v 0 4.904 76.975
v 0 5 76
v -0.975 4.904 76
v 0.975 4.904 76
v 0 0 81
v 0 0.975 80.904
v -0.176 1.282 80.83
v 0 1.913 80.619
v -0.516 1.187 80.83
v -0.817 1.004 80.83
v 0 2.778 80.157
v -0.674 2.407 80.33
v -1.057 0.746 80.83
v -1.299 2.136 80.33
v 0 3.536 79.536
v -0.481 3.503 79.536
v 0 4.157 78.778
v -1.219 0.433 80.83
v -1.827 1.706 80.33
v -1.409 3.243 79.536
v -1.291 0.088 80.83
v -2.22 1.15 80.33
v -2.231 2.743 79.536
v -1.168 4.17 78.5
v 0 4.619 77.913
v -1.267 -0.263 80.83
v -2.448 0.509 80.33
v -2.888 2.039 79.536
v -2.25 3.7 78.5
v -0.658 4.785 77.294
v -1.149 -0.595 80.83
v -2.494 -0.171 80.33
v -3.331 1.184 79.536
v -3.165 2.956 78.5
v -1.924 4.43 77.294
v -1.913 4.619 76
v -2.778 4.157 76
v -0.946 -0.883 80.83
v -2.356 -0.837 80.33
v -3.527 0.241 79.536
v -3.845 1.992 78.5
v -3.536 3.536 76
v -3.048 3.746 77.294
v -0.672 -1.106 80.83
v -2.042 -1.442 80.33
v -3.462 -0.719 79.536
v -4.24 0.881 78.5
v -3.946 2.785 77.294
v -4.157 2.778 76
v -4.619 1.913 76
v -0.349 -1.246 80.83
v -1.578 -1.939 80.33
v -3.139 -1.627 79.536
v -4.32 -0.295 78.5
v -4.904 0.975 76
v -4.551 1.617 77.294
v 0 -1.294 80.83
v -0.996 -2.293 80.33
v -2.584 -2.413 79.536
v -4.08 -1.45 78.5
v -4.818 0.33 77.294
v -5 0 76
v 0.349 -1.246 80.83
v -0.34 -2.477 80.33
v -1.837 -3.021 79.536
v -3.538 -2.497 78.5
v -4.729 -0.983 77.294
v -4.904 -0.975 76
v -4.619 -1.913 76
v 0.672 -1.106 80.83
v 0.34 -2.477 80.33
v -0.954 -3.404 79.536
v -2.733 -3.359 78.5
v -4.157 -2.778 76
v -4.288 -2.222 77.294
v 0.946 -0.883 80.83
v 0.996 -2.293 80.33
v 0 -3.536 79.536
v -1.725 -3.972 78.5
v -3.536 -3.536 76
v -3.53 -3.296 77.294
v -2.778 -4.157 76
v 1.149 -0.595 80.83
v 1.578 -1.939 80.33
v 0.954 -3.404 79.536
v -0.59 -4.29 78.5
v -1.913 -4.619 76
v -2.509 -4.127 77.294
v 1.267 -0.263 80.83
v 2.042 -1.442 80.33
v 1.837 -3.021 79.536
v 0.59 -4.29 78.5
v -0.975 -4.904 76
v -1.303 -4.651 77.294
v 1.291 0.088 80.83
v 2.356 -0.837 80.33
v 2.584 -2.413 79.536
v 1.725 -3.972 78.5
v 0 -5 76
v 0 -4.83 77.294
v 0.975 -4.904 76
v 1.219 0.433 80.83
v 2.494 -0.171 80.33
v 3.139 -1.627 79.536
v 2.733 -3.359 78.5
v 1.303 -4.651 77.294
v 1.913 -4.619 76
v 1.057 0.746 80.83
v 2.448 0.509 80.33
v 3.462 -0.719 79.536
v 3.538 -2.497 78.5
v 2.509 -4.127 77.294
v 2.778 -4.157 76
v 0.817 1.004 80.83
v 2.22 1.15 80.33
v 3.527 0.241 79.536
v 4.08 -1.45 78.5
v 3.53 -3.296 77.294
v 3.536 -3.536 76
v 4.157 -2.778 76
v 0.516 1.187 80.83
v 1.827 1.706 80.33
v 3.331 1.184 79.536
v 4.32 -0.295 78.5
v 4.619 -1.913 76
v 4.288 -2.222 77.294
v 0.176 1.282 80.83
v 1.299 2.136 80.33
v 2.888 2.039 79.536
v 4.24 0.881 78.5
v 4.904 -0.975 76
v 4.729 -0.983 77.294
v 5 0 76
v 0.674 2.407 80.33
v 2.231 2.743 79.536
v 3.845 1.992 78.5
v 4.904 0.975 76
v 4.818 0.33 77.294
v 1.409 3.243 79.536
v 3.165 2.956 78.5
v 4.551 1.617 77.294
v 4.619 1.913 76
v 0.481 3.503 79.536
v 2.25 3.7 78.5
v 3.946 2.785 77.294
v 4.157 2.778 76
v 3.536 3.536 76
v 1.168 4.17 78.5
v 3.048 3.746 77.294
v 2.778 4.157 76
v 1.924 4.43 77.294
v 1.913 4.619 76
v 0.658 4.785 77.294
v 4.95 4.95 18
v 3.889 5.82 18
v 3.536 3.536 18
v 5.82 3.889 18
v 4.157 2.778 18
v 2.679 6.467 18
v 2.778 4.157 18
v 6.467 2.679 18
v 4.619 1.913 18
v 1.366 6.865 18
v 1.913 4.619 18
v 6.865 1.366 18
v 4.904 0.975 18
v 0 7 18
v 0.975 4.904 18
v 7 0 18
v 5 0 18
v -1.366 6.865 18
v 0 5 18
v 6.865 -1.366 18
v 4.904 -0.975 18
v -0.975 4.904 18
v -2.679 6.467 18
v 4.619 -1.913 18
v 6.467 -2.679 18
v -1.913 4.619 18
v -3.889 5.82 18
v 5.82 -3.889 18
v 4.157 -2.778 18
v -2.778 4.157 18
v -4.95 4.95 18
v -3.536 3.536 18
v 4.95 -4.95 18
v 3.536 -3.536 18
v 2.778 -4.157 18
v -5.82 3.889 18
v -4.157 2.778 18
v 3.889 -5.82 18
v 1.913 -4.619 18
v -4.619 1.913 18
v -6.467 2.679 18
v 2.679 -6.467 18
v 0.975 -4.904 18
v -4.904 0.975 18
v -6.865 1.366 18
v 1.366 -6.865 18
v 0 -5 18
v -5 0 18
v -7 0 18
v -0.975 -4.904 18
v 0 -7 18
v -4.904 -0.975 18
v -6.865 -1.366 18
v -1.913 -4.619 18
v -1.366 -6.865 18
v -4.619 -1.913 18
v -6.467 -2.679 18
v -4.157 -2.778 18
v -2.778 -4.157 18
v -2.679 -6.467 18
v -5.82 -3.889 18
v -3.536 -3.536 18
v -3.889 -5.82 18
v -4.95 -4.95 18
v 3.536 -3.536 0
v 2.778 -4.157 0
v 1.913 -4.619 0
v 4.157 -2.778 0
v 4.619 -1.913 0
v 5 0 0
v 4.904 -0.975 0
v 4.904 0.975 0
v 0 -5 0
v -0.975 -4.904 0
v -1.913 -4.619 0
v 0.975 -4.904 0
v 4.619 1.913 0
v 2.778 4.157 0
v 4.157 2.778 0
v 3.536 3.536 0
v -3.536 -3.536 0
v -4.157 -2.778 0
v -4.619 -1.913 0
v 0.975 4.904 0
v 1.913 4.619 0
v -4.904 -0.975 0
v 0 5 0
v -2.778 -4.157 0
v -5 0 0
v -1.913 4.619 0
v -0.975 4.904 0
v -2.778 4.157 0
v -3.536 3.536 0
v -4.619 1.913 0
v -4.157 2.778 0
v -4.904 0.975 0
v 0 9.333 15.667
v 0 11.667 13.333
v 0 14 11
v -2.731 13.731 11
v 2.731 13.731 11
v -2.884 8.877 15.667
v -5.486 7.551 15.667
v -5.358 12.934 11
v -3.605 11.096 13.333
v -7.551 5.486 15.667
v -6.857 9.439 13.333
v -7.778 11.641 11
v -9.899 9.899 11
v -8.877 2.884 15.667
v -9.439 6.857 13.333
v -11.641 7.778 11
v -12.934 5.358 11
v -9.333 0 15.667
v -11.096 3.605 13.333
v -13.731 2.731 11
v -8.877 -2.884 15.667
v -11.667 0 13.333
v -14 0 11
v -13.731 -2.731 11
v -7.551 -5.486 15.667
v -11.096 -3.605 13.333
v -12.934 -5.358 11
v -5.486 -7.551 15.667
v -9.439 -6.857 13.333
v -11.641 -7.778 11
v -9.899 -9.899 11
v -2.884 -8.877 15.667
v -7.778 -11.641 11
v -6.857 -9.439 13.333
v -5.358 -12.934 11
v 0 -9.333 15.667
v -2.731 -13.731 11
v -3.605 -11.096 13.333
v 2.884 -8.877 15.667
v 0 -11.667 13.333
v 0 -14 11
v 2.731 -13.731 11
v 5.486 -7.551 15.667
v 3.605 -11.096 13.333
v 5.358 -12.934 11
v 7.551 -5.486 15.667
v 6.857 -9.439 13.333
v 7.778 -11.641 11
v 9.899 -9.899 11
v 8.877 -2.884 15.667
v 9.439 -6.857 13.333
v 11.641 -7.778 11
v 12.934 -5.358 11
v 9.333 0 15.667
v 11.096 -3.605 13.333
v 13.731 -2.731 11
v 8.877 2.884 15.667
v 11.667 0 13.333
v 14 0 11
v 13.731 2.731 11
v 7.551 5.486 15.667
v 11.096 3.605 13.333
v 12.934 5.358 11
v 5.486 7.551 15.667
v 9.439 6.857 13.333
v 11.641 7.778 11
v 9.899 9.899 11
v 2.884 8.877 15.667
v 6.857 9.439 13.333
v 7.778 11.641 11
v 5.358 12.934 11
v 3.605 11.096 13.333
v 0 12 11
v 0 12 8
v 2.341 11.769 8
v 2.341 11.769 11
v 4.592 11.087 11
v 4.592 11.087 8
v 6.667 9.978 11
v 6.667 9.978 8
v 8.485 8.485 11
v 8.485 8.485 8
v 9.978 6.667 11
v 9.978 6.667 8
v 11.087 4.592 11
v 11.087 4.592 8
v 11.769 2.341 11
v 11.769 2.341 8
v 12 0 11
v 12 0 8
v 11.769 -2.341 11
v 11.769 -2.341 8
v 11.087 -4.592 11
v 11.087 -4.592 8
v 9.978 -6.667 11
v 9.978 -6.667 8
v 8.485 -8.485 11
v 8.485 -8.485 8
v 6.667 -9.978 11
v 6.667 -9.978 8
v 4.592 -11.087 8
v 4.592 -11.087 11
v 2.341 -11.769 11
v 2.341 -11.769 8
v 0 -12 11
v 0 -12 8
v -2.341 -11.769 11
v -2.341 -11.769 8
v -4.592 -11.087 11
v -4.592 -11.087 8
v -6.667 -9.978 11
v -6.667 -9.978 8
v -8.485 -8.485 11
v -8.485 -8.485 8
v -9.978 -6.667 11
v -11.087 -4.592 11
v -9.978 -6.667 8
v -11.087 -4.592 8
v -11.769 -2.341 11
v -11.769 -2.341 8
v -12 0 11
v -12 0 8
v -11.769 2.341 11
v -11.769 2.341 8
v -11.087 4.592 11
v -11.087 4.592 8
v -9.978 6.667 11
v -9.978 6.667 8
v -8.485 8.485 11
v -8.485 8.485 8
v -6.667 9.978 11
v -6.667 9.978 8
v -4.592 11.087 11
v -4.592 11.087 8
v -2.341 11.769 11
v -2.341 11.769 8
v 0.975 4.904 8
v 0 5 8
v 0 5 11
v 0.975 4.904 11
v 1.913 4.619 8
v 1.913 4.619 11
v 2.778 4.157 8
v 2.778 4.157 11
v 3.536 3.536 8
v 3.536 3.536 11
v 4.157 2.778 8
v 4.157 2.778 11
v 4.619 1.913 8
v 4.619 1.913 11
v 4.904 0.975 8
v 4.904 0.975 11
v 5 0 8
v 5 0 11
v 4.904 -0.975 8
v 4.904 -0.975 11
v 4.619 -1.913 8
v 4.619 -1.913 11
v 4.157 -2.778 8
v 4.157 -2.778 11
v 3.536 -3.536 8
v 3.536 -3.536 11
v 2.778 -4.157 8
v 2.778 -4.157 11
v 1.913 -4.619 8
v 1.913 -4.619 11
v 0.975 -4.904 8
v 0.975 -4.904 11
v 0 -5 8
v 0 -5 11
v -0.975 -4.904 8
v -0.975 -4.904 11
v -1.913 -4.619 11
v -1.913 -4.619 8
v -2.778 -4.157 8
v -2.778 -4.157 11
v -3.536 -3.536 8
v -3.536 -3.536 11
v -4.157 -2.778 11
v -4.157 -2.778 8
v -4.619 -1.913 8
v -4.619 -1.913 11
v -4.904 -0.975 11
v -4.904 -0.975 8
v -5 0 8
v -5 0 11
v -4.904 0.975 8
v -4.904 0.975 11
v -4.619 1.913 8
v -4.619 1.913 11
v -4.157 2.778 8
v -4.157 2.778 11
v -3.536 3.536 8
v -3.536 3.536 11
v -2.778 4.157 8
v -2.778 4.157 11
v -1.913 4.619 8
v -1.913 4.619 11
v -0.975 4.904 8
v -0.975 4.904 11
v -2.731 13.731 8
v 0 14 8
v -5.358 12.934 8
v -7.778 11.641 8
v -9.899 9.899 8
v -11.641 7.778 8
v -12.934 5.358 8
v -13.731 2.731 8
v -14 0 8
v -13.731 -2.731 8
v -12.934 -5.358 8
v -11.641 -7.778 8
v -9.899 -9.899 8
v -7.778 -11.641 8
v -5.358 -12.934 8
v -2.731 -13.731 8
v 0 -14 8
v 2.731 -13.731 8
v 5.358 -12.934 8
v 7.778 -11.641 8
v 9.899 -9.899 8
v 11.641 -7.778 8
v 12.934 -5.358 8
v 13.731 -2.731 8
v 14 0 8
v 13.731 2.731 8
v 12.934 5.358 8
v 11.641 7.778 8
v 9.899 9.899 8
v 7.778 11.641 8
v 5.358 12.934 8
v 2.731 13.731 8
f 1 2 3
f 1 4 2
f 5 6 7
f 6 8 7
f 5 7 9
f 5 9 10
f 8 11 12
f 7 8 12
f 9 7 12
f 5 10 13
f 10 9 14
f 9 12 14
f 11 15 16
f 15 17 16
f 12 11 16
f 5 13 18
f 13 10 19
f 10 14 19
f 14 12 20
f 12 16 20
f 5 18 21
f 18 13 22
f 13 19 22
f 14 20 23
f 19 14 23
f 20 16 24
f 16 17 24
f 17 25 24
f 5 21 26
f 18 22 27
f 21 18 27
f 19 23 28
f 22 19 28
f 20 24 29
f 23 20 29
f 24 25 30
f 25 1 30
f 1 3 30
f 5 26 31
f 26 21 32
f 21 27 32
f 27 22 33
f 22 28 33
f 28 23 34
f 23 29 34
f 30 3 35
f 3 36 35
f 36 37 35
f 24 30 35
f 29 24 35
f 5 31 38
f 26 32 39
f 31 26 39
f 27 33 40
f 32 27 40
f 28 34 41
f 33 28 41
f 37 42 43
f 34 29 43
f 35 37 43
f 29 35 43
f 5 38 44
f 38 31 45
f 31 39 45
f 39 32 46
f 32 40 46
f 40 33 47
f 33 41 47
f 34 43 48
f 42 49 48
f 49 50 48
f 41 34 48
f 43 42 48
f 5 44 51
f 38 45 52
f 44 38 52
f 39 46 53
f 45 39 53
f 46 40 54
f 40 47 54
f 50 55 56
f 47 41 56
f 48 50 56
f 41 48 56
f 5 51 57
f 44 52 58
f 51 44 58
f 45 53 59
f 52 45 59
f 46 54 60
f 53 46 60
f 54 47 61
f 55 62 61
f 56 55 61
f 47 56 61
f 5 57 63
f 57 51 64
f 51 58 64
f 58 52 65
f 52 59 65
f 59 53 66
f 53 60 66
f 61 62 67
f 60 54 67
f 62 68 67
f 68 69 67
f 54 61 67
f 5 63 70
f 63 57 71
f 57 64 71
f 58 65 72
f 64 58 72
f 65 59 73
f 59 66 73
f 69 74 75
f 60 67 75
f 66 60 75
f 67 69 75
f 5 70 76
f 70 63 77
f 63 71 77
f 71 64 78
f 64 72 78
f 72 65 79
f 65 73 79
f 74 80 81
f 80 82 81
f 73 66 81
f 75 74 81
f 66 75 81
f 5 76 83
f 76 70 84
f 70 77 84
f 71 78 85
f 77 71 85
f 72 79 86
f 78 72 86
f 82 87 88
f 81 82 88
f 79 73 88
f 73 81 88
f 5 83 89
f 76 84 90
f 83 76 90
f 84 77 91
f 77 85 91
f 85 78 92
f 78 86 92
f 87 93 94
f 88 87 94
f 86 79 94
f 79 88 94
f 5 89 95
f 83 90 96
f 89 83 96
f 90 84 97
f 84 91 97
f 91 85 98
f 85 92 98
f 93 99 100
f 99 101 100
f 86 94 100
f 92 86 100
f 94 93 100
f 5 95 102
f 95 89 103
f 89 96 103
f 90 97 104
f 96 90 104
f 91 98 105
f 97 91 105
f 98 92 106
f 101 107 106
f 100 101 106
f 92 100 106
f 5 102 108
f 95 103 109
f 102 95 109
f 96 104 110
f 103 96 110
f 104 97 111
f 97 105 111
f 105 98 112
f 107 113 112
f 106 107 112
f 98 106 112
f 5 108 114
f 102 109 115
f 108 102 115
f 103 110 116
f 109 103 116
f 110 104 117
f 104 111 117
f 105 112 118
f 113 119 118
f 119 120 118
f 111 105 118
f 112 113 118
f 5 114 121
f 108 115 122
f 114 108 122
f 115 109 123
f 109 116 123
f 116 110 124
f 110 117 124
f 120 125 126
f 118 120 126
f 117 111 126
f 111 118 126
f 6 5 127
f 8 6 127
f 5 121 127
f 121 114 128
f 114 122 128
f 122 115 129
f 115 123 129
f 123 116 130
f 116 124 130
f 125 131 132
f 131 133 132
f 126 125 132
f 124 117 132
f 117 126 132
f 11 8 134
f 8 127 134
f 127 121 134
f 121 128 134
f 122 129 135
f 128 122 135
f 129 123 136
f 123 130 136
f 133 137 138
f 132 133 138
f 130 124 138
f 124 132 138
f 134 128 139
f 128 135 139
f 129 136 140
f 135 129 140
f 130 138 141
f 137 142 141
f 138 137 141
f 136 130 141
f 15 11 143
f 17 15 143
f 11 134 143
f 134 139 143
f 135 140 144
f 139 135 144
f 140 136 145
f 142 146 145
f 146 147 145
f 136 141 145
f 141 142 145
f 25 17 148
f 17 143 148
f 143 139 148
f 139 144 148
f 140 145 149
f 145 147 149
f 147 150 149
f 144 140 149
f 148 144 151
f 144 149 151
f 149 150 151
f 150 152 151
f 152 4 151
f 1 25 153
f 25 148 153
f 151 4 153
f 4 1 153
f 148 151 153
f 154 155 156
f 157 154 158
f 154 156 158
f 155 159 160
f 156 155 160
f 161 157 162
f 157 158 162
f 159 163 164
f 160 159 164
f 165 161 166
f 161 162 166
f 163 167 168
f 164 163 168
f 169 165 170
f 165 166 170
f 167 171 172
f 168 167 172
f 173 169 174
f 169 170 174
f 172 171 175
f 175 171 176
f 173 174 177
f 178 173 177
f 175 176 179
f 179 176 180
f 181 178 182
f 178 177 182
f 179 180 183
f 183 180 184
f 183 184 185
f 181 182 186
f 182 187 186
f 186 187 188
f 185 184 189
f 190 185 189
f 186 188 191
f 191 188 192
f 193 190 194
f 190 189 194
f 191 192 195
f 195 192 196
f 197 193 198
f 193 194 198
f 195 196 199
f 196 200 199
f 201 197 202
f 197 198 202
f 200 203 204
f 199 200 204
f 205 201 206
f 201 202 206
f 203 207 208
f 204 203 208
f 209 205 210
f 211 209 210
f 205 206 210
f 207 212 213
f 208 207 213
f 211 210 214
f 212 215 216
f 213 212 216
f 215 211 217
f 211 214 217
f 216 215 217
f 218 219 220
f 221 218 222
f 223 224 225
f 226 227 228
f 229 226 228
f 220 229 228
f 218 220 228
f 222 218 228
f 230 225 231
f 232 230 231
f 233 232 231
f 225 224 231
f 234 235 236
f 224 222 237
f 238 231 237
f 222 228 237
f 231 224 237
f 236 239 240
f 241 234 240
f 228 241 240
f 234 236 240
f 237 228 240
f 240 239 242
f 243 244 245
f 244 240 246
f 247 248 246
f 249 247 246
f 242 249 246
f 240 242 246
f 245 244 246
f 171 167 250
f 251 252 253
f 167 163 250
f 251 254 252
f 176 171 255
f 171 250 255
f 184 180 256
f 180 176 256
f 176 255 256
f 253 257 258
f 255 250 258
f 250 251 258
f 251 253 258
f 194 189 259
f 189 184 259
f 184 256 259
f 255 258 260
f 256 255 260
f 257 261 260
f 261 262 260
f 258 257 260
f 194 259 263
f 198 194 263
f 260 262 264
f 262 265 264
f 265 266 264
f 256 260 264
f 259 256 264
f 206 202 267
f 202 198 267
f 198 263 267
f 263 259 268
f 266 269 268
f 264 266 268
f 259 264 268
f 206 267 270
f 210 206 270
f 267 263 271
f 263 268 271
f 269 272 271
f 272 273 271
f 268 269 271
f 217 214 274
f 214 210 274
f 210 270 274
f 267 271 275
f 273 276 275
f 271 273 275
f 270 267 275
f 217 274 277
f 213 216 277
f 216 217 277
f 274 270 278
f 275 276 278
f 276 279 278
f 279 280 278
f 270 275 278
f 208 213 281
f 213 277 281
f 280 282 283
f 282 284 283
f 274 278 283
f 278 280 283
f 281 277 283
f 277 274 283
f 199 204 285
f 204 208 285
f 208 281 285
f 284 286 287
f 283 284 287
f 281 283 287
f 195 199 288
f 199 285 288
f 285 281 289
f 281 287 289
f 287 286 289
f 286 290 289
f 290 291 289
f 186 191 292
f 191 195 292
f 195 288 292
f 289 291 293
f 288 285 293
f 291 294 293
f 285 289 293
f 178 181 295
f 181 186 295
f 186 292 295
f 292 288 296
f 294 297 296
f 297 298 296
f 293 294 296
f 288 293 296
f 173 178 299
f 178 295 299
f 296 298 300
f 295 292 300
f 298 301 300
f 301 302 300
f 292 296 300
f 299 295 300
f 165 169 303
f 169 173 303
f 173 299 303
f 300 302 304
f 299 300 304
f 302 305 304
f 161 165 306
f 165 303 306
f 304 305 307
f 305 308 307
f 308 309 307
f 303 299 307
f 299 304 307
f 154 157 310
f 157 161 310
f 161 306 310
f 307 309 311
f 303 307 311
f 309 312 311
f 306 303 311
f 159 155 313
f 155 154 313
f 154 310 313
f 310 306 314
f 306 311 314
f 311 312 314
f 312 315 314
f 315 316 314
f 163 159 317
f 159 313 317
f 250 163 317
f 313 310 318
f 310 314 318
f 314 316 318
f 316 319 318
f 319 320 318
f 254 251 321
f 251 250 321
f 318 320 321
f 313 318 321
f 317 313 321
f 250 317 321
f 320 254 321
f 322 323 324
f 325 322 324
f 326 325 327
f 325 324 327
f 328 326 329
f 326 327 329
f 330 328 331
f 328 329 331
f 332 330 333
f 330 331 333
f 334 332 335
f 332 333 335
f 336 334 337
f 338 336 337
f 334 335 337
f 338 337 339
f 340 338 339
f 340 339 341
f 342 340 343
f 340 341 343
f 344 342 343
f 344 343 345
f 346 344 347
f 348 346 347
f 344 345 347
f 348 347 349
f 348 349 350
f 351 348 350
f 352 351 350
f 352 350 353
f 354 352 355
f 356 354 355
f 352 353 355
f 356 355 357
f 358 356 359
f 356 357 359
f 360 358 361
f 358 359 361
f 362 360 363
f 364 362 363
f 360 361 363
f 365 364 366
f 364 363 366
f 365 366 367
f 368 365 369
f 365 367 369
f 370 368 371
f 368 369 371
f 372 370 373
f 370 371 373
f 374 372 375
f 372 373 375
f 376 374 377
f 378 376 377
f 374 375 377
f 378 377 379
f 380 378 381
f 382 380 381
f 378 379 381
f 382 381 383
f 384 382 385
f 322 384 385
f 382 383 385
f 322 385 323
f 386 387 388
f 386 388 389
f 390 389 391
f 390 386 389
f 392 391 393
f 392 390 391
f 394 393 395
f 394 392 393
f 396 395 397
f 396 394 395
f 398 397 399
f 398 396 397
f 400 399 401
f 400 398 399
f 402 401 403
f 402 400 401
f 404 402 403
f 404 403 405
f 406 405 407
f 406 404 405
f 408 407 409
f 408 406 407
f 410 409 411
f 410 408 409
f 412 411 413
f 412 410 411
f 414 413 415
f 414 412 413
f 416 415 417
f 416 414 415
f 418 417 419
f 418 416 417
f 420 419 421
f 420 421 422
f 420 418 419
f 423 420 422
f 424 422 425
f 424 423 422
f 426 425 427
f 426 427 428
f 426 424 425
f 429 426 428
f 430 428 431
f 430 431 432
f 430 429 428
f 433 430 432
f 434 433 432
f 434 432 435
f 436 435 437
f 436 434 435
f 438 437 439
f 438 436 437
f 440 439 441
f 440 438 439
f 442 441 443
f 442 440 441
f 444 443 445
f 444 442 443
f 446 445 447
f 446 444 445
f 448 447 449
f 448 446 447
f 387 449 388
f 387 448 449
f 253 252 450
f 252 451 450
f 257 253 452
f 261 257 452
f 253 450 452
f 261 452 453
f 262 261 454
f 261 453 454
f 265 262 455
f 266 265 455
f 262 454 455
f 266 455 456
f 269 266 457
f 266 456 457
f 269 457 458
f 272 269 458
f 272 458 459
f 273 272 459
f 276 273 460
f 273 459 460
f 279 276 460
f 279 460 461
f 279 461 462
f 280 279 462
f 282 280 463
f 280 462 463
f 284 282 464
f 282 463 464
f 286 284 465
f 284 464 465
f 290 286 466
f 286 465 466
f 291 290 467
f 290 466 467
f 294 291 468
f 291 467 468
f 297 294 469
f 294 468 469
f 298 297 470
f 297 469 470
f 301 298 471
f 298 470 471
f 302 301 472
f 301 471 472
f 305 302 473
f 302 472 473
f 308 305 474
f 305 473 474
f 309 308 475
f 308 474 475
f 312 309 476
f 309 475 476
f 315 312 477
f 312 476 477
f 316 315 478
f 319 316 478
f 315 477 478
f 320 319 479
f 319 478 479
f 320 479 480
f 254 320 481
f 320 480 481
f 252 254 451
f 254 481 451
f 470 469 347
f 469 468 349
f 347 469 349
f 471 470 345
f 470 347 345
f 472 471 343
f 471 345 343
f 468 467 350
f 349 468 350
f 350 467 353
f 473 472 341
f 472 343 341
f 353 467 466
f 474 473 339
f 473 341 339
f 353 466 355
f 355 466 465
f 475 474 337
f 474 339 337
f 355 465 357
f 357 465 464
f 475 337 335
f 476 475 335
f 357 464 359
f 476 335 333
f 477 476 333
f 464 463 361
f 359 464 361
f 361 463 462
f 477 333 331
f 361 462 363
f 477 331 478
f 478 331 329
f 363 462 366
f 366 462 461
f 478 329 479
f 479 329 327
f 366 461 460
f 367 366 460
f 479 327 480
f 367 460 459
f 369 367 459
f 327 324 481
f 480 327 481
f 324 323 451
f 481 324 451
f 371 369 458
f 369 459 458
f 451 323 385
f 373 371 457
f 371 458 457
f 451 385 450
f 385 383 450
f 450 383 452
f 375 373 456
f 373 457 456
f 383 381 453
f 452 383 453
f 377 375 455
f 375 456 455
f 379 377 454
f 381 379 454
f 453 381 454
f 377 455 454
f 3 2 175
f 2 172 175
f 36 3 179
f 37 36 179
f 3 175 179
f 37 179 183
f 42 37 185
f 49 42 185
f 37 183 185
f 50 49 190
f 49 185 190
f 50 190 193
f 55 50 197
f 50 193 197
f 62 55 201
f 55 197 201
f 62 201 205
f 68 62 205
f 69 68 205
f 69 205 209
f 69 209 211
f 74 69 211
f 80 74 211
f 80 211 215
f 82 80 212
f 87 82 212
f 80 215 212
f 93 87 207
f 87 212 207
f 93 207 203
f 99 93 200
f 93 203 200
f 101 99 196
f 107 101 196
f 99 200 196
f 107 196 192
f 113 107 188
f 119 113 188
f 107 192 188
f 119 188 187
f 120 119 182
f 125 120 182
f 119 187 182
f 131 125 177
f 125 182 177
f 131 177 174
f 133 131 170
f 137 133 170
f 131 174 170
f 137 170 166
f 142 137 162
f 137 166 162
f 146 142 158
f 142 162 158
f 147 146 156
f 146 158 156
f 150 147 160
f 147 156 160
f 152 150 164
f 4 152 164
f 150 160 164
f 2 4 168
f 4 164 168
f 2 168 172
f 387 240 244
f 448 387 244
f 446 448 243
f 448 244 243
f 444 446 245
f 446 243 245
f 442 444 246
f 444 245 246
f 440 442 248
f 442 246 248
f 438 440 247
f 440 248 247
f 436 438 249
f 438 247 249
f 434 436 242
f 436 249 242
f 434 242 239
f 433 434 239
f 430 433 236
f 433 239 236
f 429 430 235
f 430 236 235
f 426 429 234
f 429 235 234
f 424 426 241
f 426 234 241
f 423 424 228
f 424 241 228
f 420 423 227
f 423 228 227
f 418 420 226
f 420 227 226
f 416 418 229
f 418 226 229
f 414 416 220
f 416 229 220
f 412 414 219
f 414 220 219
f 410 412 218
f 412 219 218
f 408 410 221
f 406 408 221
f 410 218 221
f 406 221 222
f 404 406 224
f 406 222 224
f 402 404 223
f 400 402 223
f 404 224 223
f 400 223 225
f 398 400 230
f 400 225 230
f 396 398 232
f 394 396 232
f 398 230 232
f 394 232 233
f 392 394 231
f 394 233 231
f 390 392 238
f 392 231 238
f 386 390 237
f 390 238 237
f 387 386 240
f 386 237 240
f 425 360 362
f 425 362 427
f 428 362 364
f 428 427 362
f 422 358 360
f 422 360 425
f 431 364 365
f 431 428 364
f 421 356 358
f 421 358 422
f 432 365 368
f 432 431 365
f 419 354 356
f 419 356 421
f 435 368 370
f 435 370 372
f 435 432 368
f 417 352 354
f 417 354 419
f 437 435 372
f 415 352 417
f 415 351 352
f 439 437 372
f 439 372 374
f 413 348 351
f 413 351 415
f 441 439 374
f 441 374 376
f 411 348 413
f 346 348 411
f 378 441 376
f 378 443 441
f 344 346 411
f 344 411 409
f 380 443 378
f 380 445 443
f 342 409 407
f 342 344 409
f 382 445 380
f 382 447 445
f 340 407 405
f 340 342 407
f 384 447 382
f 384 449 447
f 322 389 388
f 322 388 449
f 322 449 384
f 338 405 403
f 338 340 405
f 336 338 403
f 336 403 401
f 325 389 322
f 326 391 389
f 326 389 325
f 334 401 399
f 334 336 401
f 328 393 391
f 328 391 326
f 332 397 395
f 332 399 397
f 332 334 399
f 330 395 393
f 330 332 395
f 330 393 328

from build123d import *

# Parameters (mm, degrees)
SKETCH_2_R          = 12
SKETCH_2_R_2        = 5
CUT_EXTRUDE_1_DEPTH = 3
SKETCH_3_W          = 5
SKETCH_3_H          = 2


with BuildPart() as part:
    # 草图1 → 旋转1 (revolve)
    with BuildSketch(Plane(origin=(0, 0, 0), x_dir=(0, 0, -1), z_dir=(1, 0, 0))):
        with BuildLine():
            Line((-76, 5), (-20, 5))
            Line((-20, 5), (-11, 14))
            Line((-11, 14), (-8, 14))
            Line((-8, 14), (-8, 5))
            Line((-8, 5), (0, 5))
            Line((0, 5), (0, 0))
            Line((0, 0), (-81, 0))
            ThreePointArc((-81, 0), (-79.535533906, 3.535533906), (-76, 5))
        make_face()
    revolve(axis=Axis((0, 0, 0), (0, 0, 1)))

    # 草图2 → 切除-拉伸1 (cut)
    with BuildSketch(Plane(origin=(0, 0, 8), x_dir=(-1, 0, 0), z_dir=(0, 0, -1))):
        with Locations(Location((0, 0, 0), (0, 0, 90))):
            Circle(SKETCH_2_R)
        with Locations(Location((0, 0, 0), (0, 0, 90))):
            Circle(SKETCH_2_R_2, mode=Mode.SUBTRACT)
    extrude(amount=-CUT_EXTRUDE_1_DEPTH, mode=Mode.SUBTRACT)

    # 草图3 → 切除-旋转1 (revolve, cut)
    with BuildSketch(Plane(origin=(0, 0, 0), x_dir=(1, 0, 0), z_dir=(0, 1, 0)), mode=Mode.PRIVATE) as cut_revolve_1_sk:
        with Locations((7.5, -19)):
            Rectangle(SKETCH_3_W, SKETCH_3_H)
    revolve(cut_revolve_1_sk.sketch.rotate(Axis((0, 0, 20), (0, 0, 1)), 90), axis=Axis((0, 0, 20), (0, 0, 1)), mode=Mode.SUBTRACT)


solid = part.part
